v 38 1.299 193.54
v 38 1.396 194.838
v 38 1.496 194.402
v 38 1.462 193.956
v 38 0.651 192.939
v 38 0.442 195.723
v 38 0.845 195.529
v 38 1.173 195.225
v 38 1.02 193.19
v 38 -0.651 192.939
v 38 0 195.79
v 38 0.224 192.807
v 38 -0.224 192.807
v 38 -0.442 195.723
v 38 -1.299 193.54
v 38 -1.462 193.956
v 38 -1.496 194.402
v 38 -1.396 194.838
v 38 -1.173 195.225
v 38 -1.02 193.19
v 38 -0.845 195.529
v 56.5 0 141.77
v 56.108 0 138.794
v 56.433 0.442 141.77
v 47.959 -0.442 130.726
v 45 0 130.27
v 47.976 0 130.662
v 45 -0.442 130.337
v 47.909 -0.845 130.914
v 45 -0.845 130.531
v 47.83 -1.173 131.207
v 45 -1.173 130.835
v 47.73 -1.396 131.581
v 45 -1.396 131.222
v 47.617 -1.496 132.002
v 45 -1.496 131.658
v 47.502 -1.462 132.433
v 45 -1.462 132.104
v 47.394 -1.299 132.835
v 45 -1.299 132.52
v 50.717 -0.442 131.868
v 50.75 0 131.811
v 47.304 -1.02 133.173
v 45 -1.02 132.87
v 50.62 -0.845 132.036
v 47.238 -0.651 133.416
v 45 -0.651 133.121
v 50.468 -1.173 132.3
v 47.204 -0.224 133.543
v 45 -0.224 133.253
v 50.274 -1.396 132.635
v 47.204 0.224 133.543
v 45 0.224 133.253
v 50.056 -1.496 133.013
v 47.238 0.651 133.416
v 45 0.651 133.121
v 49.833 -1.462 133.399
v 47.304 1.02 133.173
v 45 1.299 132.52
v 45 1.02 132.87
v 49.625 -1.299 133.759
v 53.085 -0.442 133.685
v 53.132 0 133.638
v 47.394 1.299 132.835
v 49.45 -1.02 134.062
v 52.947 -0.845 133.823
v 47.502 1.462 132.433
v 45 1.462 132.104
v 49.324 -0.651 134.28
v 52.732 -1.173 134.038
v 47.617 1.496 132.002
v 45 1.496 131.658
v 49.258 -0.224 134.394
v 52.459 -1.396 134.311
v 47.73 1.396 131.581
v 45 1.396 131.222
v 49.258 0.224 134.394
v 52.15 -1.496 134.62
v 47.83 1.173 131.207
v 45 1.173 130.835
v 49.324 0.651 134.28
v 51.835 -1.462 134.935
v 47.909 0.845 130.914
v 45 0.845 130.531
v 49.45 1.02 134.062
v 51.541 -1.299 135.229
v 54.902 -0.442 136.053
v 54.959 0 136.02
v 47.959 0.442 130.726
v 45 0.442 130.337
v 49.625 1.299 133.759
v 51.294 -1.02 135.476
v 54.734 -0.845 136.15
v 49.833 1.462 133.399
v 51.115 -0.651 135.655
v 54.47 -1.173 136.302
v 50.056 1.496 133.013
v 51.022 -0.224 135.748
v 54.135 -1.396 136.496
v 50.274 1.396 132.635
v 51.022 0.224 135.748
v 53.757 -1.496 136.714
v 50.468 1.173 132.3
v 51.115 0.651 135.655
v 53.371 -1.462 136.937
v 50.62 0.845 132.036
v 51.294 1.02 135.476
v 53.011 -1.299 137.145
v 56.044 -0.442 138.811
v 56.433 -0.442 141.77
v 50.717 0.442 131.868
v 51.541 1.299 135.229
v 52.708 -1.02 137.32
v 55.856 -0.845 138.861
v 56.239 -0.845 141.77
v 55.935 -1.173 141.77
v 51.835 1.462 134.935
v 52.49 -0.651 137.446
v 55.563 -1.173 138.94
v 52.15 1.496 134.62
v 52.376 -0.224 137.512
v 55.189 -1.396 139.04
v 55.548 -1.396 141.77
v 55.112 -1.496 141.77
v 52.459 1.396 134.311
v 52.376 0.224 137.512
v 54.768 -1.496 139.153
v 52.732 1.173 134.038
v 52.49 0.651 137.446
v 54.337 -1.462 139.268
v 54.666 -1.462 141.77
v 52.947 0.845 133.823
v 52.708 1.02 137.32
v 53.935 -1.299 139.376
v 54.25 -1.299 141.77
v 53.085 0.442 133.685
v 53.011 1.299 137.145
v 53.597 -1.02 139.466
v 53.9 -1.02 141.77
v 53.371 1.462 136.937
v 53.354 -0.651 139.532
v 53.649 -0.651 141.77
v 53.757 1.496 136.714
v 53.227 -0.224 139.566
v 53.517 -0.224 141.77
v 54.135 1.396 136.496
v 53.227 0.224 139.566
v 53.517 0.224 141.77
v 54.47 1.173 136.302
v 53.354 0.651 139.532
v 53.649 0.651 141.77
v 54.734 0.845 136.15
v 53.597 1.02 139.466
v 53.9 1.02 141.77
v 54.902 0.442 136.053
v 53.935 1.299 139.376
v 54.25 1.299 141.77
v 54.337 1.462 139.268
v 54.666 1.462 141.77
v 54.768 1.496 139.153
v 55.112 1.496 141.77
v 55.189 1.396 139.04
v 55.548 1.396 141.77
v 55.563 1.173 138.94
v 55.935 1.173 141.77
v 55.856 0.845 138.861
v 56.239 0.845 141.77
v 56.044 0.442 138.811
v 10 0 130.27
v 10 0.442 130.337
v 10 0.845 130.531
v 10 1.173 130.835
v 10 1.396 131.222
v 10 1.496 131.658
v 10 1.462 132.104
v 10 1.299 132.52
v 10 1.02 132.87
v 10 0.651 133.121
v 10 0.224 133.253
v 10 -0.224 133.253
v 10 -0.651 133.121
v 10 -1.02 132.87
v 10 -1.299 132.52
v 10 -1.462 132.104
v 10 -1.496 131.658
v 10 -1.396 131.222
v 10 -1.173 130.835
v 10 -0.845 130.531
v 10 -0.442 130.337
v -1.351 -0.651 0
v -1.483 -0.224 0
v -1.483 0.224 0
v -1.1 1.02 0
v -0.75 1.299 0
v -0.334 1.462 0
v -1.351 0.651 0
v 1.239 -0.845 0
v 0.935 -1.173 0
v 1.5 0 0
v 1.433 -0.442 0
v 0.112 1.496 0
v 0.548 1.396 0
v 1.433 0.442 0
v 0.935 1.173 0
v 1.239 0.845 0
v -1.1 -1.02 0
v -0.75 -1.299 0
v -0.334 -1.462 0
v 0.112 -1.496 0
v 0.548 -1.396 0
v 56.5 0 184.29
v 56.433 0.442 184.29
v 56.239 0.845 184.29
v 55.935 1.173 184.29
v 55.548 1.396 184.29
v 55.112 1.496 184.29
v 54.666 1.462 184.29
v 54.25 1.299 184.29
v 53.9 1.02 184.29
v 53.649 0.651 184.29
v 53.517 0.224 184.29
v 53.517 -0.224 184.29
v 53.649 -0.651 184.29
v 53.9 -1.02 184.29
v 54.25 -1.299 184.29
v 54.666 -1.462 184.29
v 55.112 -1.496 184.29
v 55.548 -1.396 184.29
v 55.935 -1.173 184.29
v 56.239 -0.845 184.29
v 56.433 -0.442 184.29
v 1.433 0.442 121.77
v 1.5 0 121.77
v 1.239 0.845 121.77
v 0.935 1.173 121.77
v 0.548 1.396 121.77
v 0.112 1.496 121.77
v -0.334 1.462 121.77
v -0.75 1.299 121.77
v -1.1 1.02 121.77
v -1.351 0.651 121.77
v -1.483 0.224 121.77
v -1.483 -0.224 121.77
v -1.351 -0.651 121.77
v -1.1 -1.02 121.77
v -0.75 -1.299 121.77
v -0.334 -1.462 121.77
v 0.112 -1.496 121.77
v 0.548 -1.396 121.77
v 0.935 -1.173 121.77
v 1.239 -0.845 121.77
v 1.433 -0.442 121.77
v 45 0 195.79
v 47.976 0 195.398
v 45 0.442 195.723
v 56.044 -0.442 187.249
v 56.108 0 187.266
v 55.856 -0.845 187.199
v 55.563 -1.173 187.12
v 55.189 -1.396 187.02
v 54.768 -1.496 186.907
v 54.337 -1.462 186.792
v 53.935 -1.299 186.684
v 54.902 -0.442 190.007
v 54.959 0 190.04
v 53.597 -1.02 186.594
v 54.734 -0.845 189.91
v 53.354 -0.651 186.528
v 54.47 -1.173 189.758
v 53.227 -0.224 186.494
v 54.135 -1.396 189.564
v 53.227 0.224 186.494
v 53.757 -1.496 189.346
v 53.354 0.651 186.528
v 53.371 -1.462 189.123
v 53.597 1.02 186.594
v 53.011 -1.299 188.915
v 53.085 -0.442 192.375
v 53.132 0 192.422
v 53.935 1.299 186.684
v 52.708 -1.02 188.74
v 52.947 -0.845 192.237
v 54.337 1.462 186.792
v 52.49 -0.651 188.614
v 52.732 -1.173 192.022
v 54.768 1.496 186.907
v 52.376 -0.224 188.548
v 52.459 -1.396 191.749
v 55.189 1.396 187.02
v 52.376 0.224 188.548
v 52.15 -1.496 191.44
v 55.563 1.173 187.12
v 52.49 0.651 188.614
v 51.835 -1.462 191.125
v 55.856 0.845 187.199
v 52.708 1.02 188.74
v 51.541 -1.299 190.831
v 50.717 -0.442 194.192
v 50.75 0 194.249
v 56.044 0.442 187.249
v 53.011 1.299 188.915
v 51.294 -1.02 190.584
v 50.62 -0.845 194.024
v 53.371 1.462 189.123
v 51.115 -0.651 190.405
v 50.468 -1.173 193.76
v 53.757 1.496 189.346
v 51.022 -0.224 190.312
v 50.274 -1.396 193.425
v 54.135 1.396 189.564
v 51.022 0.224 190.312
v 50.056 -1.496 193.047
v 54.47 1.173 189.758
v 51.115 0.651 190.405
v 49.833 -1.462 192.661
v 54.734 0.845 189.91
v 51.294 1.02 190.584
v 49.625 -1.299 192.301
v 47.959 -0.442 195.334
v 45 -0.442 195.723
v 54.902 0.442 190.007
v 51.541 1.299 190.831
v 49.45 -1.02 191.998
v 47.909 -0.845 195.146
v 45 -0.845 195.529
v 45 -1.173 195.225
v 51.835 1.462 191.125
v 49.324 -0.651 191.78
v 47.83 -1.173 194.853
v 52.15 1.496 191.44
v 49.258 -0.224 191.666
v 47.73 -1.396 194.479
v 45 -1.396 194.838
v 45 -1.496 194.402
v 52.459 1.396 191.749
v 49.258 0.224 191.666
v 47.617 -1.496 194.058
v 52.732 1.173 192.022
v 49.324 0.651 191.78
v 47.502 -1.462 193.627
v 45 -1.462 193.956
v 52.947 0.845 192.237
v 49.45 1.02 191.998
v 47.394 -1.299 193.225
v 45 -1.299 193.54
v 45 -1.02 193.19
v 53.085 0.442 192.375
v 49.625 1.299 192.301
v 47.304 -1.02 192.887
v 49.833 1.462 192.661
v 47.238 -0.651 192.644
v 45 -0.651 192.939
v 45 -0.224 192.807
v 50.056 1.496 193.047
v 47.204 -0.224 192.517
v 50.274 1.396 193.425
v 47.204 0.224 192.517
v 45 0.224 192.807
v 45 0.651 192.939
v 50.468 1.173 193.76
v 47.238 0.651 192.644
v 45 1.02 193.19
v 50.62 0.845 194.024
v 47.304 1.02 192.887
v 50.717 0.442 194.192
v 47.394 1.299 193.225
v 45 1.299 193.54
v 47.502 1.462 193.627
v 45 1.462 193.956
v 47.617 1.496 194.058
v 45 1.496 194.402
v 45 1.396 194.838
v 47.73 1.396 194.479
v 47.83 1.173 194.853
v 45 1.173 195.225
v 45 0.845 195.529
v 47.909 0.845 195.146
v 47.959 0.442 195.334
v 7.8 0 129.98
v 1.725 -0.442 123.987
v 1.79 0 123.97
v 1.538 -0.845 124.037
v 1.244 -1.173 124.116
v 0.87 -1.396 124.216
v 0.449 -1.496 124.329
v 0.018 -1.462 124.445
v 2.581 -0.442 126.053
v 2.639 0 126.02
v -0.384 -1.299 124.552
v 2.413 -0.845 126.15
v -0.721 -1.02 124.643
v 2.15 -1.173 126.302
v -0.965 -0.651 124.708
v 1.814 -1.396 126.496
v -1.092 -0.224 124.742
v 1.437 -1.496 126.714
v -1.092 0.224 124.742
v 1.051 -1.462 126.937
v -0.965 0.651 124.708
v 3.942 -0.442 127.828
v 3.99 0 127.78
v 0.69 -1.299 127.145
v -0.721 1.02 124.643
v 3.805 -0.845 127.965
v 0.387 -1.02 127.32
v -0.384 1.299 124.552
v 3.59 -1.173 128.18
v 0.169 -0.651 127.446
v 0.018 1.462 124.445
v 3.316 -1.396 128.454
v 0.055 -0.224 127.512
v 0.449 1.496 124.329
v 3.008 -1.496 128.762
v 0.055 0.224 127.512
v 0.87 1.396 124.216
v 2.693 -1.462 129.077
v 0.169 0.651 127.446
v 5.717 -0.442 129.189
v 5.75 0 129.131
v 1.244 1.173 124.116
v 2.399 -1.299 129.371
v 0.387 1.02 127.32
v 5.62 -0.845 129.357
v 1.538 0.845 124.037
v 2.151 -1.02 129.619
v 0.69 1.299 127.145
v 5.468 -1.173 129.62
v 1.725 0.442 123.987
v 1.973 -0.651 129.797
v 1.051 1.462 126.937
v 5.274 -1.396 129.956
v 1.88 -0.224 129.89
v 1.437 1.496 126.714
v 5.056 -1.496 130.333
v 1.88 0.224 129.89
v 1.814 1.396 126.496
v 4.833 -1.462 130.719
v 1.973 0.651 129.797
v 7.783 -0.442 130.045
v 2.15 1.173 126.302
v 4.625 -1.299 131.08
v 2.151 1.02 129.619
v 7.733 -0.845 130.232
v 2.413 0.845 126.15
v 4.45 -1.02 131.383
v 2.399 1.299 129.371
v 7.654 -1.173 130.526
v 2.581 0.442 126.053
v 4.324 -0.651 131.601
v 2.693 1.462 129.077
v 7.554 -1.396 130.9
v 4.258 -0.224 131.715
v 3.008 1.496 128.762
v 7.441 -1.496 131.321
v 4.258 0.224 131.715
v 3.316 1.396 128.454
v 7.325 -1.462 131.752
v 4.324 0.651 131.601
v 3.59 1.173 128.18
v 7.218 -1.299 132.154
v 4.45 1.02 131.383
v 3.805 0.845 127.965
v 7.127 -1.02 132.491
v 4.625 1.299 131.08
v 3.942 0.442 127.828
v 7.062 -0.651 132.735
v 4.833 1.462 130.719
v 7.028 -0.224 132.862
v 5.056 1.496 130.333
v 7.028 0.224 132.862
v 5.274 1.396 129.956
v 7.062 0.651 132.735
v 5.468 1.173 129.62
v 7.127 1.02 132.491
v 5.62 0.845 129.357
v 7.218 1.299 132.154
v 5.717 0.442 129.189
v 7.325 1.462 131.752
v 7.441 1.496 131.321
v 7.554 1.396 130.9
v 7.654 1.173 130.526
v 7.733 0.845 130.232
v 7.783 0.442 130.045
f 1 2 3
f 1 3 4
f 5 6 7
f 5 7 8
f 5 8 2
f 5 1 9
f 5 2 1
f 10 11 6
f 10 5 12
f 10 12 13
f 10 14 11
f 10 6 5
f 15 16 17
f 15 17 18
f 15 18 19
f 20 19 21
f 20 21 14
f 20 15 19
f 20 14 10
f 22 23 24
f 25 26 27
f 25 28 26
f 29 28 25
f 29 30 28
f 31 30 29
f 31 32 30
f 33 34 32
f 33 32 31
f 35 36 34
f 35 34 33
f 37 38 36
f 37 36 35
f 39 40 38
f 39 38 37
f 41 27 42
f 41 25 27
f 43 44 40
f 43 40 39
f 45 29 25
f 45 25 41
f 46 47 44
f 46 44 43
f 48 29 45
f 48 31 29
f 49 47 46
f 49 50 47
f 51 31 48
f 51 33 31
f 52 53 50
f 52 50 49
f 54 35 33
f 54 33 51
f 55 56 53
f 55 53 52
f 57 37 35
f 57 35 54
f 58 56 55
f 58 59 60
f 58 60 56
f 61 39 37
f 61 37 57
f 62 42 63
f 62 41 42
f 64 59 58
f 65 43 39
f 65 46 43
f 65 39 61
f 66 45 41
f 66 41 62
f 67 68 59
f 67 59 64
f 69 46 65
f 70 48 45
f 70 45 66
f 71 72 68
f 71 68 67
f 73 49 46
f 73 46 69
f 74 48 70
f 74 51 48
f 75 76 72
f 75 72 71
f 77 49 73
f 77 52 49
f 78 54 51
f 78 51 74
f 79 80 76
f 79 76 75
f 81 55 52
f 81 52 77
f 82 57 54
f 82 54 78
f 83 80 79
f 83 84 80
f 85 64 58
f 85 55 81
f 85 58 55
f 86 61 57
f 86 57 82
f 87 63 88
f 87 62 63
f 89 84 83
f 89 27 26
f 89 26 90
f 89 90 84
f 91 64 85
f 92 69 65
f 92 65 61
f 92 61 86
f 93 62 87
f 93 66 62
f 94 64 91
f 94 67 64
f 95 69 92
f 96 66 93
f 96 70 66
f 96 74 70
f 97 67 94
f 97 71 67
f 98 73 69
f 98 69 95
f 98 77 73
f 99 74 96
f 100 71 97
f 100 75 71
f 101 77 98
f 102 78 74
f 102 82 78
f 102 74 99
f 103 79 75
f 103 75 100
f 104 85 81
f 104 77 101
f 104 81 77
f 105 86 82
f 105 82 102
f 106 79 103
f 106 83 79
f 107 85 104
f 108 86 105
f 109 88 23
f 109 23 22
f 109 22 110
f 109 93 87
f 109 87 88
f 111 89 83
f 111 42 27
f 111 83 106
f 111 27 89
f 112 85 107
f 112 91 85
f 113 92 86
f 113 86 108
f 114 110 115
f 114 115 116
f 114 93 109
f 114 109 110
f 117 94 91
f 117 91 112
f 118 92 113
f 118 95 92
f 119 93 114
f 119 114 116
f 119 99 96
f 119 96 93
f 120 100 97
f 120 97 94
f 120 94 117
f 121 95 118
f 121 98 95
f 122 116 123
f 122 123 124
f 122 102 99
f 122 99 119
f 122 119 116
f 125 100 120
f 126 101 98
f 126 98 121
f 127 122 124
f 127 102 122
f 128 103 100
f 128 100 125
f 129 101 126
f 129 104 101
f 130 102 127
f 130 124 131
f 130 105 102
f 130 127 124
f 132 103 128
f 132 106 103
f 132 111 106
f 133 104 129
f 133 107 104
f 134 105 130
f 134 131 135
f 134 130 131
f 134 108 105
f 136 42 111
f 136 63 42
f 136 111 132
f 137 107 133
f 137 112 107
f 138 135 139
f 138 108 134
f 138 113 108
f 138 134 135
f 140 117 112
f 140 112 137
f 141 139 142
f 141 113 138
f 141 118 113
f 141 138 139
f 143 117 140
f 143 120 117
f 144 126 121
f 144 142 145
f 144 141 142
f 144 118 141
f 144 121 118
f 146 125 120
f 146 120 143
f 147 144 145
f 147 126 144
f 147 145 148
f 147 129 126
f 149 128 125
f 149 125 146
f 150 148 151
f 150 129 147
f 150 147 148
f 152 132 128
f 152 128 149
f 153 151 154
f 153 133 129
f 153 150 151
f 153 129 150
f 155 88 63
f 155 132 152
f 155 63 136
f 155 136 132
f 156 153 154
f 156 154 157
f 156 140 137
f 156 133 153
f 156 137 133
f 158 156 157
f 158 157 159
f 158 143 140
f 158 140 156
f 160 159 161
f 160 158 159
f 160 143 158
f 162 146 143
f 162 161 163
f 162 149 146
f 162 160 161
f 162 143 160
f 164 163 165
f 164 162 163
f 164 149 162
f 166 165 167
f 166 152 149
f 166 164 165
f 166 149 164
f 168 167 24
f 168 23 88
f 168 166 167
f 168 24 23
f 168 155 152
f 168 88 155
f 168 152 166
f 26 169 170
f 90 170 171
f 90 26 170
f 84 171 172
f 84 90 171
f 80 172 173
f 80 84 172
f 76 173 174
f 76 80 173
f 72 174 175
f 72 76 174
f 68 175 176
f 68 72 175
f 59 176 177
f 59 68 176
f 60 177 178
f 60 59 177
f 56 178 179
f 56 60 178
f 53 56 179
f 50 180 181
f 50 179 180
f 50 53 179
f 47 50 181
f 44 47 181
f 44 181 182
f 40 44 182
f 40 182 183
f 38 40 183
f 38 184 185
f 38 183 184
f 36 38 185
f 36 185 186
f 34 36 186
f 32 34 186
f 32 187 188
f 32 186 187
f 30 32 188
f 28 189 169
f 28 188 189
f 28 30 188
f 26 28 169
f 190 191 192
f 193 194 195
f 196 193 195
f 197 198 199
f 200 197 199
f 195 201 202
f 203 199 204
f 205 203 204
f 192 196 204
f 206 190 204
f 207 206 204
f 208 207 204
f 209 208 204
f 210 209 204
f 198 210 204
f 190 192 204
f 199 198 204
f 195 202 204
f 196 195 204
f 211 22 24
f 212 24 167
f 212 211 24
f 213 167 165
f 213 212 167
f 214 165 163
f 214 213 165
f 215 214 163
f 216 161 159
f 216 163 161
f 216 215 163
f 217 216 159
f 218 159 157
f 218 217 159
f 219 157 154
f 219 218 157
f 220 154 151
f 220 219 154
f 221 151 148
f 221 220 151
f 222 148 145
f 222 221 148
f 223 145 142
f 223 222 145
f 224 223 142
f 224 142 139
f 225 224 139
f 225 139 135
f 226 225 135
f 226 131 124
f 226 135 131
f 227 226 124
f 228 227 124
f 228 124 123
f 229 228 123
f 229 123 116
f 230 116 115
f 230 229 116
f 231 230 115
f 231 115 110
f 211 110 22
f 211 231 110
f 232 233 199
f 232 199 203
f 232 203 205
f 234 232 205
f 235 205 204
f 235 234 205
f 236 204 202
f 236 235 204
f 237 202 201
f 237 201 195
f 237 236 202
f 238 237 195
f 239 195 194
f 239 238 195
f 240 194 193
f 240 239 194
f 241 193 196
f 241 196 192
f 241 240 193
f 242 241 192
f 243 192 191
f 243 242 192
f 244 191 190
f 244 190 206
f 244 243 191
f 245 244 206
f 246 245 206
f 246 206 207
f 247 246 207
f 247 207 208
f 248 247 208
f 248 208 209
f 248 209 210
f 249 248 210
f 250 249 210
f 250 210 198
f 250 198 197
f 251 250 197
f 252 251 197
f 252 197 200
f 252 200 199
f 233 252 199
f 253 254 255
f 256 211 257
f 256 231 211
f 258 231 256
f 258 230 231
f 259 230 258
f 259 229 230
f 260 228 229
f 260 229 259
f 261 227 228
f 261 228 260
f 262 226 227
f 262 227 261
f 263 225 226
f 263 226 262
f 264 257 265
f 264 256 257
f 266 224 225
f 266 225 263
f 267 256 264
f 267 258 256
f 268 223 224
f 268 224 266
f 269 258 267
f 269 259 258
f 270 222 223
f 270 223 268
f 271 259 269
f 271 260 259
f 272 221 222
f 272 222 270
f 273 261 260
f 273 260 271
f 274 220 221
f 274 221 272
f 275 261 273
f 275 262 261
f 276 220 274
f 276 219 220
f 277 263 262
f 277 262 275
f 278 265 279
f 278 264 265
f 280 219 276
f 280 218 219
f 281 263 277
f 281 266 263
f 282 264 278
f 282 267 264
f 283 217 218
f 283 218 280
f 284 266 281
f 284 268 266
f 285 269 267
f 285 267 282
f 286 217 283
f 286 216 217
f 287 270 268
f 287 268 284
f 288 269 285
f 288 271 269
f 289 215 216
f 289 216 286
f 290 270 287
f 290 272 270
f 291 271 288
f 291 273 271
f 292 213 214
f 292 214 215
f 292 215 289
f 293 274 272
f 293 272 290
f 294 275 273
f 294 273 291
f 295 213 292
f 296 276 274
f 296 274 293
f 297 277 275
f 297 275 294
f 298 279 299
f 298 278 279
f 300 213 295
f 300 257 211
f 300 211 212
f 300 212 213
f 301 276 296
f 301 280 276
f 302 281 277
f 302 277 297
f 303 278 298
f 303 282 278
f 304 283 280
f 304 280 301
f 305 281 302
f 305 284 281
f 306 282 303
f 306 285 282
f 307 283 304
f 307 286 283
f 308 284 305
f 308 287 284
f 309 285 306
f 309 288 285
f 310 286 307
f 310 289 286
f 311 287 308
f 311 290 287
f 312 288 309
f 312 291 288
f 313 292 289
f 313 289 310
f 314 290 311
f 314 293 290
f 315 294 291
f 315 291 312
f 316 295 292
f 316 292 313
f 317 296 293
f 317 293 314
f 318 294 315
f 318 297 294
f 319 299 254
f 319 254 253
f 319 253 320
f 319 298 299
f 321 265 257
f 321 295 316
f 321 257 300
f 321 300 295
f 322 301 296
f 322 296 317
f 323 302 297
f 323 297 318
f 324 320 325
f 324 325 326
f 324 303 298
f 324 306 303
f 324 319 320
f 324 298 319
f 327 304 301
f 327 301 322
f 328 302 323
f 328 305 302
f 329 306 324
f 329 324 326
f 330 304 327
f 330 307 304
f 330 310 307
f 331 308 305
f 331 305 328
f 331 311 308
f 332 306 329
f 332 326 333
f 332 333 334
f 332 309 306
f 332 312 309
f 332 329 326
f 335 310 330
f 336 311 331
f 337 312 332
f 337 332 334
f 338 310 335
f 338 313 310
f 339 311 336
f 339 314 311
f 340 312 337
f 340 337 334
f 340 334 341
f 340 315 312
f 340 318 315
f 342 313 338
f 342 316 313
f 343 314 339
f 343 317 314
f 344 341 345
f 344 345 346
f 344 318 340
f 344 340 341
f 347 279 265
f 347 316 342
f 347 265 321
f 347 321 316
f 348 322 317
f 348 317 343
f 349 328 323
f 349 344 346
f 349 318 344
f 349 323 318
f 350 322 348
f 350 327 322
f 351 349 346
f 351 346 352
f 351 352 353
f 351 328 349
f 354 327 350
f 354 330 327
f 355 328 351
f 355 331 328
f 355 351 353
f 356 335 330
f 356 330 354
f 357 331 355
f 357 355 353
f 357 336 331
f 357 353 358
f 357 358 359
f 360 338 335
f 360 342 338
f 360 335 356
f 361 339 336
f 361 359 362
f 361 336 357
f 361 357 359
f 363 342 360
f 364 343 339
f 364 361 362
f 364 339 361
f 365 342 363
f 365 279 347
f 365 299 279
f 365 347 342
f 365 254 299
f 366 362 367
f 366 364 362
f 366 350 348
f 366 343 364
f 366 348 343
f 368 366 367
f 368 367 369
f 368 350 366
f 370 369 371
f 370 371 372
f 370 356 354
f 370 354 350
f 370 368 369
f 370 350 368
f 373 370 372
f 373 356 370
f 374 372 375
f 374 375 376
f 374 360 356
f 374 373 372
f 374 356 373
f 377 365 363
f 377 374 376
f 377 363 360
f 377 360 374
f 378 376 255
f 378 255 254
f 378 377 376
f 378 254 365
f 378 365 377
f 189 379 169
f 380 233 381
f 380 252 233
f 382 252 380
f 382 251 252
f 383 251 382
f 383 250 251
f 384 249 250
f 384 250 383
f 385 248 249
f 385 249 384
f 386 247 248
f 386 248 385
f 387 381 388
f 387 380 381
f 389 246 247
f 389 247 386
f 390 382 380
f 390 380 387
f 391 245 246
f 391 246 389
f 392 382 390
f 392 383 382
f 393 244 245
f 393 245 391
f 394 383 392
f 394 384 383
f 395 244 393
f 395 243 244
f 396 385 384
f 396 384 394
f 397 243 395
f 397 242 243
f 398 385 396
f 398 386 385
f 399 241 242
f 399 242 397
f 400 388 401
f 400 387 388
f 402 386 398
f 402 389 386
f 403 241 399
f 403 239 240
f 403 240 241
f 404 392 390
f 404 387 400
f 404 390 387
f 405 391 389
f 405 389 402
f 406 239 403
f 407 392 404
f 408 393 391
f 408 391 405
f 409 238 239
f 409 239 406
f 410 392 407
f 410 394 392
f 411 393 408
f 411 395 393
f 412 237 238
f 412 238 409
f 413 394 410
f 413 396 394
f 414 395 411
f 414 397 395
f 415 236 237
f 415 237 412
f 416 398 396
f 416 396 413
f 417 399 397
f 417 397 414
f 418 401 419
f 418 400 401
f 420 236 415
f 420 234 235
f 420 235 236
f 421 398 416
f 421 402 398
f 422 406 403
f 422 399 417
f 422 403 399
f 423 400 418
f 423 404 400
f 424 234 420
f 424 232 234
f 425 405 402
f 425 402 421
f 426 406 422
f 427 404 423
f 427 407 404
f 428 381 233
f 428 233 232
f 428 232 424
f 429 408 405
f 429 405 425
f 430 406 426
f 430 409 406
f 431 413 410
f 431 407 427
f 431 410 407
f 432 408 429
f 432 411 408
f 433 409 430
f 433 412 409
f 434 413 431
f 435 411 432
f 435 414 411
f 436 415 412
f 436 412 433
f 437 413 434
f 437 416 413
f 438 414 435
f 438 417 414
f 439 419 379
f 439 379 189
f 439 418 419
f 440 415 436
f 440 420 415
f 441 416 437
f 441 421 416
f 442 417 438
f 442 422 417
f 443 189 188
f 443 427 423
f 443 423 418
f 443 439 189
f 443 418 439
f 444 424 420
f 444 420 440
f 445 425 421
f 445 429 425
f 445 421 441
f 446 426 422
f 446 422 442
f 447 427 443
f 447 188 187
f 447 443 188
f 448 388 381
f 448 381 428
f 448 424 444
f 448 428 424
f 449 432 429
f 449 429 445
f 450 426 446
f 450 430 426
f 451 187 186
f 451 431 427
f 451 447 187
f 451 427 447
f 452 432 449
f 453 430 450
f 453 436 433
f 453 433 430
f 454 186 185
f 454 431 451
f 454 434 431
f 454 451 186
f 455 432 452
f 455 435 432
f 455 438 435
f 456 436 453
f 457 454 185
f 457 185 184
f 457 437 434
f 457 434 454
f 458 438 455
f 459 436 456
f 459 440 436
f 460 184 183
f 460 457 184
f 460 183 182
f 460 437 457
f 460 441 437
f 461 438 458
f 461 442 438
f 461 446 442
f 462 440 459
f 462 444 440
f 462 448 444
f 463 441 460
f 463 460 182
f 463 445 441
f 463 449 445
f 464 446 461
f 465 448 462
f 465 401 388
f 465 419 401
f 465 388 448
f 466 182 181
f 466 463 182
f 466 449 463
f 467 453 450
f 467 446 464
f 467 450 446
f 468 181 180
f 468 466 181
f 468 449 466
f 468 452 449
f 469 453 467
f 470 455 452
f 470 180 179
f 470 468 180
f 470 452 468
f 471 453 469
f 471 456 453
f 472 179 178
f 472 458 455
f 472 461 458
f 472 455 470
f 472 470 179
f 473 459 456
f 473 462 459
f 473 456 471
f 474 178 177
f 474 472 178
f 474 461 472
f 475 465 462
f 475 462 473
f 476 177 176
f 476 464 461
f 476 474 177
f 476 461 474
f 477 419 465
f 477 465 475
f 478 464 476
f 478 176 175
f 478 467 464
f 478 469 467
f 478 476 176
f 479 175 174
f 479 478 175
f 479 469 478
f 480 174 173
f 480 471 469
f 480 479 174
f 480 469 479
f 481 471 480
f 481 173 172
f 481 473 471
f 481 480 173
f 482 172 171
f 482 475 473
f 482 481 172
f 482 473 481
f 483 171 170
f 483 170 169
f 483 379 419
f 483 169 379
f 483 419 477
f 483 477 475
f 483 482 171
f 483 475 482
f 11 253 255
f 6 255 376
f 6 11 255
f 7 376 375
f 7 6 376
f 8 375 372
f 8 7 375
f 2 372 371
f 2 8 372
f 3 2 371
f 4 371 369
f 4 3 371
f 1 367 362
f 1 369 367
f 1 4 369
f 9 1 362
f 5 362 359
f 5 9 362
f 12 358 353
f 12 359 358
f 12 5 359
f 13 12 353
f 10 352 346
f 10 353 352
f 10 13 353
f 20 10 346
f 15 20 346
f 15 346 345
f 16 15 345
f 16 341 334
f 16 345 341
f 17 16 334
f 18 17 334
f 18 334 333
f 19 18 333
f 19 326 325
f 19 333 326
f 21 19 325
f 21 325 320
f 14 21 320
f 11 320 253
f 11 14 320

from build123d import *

# Parameters (mm, degrees)
BARRER2_PROFILE_R = 1.5


with BuildPart() as part:
    # Barrer2: sweep along a path in Croquis1
    with BuildLine(Plane(origin=(0, 0, 0), x_dir=(1, 0, 0), z_dir=(0, 1, 0))) as barrer2_path:
        Line((0, 0), (0, -121.77))
        ThreePointArc((0, -121.77), (2.928932188, -128.841067812), (10, -131.77))
        Line((10, -131.77), (45, -131.77))
        ThreePointArc((45, -131.77), (52.071067812, -134.698932188), (55, -141.77))
        Line((55, -141.77), (55, -184.29))
        ThreePointArc((55, -184.29), (52.071067812, -191.361067812), (45, -194.29))
        Line((45, -194.29), (38, -194.29))
    # Barrer2 profile (on start of the path) → Barrer2 (sweep)
    with BuildSketch(Plane.XY):
        Circle(BARRER2_PROFILE_R)
    sweep(path=barrer2_path.line)


solid = part.part
